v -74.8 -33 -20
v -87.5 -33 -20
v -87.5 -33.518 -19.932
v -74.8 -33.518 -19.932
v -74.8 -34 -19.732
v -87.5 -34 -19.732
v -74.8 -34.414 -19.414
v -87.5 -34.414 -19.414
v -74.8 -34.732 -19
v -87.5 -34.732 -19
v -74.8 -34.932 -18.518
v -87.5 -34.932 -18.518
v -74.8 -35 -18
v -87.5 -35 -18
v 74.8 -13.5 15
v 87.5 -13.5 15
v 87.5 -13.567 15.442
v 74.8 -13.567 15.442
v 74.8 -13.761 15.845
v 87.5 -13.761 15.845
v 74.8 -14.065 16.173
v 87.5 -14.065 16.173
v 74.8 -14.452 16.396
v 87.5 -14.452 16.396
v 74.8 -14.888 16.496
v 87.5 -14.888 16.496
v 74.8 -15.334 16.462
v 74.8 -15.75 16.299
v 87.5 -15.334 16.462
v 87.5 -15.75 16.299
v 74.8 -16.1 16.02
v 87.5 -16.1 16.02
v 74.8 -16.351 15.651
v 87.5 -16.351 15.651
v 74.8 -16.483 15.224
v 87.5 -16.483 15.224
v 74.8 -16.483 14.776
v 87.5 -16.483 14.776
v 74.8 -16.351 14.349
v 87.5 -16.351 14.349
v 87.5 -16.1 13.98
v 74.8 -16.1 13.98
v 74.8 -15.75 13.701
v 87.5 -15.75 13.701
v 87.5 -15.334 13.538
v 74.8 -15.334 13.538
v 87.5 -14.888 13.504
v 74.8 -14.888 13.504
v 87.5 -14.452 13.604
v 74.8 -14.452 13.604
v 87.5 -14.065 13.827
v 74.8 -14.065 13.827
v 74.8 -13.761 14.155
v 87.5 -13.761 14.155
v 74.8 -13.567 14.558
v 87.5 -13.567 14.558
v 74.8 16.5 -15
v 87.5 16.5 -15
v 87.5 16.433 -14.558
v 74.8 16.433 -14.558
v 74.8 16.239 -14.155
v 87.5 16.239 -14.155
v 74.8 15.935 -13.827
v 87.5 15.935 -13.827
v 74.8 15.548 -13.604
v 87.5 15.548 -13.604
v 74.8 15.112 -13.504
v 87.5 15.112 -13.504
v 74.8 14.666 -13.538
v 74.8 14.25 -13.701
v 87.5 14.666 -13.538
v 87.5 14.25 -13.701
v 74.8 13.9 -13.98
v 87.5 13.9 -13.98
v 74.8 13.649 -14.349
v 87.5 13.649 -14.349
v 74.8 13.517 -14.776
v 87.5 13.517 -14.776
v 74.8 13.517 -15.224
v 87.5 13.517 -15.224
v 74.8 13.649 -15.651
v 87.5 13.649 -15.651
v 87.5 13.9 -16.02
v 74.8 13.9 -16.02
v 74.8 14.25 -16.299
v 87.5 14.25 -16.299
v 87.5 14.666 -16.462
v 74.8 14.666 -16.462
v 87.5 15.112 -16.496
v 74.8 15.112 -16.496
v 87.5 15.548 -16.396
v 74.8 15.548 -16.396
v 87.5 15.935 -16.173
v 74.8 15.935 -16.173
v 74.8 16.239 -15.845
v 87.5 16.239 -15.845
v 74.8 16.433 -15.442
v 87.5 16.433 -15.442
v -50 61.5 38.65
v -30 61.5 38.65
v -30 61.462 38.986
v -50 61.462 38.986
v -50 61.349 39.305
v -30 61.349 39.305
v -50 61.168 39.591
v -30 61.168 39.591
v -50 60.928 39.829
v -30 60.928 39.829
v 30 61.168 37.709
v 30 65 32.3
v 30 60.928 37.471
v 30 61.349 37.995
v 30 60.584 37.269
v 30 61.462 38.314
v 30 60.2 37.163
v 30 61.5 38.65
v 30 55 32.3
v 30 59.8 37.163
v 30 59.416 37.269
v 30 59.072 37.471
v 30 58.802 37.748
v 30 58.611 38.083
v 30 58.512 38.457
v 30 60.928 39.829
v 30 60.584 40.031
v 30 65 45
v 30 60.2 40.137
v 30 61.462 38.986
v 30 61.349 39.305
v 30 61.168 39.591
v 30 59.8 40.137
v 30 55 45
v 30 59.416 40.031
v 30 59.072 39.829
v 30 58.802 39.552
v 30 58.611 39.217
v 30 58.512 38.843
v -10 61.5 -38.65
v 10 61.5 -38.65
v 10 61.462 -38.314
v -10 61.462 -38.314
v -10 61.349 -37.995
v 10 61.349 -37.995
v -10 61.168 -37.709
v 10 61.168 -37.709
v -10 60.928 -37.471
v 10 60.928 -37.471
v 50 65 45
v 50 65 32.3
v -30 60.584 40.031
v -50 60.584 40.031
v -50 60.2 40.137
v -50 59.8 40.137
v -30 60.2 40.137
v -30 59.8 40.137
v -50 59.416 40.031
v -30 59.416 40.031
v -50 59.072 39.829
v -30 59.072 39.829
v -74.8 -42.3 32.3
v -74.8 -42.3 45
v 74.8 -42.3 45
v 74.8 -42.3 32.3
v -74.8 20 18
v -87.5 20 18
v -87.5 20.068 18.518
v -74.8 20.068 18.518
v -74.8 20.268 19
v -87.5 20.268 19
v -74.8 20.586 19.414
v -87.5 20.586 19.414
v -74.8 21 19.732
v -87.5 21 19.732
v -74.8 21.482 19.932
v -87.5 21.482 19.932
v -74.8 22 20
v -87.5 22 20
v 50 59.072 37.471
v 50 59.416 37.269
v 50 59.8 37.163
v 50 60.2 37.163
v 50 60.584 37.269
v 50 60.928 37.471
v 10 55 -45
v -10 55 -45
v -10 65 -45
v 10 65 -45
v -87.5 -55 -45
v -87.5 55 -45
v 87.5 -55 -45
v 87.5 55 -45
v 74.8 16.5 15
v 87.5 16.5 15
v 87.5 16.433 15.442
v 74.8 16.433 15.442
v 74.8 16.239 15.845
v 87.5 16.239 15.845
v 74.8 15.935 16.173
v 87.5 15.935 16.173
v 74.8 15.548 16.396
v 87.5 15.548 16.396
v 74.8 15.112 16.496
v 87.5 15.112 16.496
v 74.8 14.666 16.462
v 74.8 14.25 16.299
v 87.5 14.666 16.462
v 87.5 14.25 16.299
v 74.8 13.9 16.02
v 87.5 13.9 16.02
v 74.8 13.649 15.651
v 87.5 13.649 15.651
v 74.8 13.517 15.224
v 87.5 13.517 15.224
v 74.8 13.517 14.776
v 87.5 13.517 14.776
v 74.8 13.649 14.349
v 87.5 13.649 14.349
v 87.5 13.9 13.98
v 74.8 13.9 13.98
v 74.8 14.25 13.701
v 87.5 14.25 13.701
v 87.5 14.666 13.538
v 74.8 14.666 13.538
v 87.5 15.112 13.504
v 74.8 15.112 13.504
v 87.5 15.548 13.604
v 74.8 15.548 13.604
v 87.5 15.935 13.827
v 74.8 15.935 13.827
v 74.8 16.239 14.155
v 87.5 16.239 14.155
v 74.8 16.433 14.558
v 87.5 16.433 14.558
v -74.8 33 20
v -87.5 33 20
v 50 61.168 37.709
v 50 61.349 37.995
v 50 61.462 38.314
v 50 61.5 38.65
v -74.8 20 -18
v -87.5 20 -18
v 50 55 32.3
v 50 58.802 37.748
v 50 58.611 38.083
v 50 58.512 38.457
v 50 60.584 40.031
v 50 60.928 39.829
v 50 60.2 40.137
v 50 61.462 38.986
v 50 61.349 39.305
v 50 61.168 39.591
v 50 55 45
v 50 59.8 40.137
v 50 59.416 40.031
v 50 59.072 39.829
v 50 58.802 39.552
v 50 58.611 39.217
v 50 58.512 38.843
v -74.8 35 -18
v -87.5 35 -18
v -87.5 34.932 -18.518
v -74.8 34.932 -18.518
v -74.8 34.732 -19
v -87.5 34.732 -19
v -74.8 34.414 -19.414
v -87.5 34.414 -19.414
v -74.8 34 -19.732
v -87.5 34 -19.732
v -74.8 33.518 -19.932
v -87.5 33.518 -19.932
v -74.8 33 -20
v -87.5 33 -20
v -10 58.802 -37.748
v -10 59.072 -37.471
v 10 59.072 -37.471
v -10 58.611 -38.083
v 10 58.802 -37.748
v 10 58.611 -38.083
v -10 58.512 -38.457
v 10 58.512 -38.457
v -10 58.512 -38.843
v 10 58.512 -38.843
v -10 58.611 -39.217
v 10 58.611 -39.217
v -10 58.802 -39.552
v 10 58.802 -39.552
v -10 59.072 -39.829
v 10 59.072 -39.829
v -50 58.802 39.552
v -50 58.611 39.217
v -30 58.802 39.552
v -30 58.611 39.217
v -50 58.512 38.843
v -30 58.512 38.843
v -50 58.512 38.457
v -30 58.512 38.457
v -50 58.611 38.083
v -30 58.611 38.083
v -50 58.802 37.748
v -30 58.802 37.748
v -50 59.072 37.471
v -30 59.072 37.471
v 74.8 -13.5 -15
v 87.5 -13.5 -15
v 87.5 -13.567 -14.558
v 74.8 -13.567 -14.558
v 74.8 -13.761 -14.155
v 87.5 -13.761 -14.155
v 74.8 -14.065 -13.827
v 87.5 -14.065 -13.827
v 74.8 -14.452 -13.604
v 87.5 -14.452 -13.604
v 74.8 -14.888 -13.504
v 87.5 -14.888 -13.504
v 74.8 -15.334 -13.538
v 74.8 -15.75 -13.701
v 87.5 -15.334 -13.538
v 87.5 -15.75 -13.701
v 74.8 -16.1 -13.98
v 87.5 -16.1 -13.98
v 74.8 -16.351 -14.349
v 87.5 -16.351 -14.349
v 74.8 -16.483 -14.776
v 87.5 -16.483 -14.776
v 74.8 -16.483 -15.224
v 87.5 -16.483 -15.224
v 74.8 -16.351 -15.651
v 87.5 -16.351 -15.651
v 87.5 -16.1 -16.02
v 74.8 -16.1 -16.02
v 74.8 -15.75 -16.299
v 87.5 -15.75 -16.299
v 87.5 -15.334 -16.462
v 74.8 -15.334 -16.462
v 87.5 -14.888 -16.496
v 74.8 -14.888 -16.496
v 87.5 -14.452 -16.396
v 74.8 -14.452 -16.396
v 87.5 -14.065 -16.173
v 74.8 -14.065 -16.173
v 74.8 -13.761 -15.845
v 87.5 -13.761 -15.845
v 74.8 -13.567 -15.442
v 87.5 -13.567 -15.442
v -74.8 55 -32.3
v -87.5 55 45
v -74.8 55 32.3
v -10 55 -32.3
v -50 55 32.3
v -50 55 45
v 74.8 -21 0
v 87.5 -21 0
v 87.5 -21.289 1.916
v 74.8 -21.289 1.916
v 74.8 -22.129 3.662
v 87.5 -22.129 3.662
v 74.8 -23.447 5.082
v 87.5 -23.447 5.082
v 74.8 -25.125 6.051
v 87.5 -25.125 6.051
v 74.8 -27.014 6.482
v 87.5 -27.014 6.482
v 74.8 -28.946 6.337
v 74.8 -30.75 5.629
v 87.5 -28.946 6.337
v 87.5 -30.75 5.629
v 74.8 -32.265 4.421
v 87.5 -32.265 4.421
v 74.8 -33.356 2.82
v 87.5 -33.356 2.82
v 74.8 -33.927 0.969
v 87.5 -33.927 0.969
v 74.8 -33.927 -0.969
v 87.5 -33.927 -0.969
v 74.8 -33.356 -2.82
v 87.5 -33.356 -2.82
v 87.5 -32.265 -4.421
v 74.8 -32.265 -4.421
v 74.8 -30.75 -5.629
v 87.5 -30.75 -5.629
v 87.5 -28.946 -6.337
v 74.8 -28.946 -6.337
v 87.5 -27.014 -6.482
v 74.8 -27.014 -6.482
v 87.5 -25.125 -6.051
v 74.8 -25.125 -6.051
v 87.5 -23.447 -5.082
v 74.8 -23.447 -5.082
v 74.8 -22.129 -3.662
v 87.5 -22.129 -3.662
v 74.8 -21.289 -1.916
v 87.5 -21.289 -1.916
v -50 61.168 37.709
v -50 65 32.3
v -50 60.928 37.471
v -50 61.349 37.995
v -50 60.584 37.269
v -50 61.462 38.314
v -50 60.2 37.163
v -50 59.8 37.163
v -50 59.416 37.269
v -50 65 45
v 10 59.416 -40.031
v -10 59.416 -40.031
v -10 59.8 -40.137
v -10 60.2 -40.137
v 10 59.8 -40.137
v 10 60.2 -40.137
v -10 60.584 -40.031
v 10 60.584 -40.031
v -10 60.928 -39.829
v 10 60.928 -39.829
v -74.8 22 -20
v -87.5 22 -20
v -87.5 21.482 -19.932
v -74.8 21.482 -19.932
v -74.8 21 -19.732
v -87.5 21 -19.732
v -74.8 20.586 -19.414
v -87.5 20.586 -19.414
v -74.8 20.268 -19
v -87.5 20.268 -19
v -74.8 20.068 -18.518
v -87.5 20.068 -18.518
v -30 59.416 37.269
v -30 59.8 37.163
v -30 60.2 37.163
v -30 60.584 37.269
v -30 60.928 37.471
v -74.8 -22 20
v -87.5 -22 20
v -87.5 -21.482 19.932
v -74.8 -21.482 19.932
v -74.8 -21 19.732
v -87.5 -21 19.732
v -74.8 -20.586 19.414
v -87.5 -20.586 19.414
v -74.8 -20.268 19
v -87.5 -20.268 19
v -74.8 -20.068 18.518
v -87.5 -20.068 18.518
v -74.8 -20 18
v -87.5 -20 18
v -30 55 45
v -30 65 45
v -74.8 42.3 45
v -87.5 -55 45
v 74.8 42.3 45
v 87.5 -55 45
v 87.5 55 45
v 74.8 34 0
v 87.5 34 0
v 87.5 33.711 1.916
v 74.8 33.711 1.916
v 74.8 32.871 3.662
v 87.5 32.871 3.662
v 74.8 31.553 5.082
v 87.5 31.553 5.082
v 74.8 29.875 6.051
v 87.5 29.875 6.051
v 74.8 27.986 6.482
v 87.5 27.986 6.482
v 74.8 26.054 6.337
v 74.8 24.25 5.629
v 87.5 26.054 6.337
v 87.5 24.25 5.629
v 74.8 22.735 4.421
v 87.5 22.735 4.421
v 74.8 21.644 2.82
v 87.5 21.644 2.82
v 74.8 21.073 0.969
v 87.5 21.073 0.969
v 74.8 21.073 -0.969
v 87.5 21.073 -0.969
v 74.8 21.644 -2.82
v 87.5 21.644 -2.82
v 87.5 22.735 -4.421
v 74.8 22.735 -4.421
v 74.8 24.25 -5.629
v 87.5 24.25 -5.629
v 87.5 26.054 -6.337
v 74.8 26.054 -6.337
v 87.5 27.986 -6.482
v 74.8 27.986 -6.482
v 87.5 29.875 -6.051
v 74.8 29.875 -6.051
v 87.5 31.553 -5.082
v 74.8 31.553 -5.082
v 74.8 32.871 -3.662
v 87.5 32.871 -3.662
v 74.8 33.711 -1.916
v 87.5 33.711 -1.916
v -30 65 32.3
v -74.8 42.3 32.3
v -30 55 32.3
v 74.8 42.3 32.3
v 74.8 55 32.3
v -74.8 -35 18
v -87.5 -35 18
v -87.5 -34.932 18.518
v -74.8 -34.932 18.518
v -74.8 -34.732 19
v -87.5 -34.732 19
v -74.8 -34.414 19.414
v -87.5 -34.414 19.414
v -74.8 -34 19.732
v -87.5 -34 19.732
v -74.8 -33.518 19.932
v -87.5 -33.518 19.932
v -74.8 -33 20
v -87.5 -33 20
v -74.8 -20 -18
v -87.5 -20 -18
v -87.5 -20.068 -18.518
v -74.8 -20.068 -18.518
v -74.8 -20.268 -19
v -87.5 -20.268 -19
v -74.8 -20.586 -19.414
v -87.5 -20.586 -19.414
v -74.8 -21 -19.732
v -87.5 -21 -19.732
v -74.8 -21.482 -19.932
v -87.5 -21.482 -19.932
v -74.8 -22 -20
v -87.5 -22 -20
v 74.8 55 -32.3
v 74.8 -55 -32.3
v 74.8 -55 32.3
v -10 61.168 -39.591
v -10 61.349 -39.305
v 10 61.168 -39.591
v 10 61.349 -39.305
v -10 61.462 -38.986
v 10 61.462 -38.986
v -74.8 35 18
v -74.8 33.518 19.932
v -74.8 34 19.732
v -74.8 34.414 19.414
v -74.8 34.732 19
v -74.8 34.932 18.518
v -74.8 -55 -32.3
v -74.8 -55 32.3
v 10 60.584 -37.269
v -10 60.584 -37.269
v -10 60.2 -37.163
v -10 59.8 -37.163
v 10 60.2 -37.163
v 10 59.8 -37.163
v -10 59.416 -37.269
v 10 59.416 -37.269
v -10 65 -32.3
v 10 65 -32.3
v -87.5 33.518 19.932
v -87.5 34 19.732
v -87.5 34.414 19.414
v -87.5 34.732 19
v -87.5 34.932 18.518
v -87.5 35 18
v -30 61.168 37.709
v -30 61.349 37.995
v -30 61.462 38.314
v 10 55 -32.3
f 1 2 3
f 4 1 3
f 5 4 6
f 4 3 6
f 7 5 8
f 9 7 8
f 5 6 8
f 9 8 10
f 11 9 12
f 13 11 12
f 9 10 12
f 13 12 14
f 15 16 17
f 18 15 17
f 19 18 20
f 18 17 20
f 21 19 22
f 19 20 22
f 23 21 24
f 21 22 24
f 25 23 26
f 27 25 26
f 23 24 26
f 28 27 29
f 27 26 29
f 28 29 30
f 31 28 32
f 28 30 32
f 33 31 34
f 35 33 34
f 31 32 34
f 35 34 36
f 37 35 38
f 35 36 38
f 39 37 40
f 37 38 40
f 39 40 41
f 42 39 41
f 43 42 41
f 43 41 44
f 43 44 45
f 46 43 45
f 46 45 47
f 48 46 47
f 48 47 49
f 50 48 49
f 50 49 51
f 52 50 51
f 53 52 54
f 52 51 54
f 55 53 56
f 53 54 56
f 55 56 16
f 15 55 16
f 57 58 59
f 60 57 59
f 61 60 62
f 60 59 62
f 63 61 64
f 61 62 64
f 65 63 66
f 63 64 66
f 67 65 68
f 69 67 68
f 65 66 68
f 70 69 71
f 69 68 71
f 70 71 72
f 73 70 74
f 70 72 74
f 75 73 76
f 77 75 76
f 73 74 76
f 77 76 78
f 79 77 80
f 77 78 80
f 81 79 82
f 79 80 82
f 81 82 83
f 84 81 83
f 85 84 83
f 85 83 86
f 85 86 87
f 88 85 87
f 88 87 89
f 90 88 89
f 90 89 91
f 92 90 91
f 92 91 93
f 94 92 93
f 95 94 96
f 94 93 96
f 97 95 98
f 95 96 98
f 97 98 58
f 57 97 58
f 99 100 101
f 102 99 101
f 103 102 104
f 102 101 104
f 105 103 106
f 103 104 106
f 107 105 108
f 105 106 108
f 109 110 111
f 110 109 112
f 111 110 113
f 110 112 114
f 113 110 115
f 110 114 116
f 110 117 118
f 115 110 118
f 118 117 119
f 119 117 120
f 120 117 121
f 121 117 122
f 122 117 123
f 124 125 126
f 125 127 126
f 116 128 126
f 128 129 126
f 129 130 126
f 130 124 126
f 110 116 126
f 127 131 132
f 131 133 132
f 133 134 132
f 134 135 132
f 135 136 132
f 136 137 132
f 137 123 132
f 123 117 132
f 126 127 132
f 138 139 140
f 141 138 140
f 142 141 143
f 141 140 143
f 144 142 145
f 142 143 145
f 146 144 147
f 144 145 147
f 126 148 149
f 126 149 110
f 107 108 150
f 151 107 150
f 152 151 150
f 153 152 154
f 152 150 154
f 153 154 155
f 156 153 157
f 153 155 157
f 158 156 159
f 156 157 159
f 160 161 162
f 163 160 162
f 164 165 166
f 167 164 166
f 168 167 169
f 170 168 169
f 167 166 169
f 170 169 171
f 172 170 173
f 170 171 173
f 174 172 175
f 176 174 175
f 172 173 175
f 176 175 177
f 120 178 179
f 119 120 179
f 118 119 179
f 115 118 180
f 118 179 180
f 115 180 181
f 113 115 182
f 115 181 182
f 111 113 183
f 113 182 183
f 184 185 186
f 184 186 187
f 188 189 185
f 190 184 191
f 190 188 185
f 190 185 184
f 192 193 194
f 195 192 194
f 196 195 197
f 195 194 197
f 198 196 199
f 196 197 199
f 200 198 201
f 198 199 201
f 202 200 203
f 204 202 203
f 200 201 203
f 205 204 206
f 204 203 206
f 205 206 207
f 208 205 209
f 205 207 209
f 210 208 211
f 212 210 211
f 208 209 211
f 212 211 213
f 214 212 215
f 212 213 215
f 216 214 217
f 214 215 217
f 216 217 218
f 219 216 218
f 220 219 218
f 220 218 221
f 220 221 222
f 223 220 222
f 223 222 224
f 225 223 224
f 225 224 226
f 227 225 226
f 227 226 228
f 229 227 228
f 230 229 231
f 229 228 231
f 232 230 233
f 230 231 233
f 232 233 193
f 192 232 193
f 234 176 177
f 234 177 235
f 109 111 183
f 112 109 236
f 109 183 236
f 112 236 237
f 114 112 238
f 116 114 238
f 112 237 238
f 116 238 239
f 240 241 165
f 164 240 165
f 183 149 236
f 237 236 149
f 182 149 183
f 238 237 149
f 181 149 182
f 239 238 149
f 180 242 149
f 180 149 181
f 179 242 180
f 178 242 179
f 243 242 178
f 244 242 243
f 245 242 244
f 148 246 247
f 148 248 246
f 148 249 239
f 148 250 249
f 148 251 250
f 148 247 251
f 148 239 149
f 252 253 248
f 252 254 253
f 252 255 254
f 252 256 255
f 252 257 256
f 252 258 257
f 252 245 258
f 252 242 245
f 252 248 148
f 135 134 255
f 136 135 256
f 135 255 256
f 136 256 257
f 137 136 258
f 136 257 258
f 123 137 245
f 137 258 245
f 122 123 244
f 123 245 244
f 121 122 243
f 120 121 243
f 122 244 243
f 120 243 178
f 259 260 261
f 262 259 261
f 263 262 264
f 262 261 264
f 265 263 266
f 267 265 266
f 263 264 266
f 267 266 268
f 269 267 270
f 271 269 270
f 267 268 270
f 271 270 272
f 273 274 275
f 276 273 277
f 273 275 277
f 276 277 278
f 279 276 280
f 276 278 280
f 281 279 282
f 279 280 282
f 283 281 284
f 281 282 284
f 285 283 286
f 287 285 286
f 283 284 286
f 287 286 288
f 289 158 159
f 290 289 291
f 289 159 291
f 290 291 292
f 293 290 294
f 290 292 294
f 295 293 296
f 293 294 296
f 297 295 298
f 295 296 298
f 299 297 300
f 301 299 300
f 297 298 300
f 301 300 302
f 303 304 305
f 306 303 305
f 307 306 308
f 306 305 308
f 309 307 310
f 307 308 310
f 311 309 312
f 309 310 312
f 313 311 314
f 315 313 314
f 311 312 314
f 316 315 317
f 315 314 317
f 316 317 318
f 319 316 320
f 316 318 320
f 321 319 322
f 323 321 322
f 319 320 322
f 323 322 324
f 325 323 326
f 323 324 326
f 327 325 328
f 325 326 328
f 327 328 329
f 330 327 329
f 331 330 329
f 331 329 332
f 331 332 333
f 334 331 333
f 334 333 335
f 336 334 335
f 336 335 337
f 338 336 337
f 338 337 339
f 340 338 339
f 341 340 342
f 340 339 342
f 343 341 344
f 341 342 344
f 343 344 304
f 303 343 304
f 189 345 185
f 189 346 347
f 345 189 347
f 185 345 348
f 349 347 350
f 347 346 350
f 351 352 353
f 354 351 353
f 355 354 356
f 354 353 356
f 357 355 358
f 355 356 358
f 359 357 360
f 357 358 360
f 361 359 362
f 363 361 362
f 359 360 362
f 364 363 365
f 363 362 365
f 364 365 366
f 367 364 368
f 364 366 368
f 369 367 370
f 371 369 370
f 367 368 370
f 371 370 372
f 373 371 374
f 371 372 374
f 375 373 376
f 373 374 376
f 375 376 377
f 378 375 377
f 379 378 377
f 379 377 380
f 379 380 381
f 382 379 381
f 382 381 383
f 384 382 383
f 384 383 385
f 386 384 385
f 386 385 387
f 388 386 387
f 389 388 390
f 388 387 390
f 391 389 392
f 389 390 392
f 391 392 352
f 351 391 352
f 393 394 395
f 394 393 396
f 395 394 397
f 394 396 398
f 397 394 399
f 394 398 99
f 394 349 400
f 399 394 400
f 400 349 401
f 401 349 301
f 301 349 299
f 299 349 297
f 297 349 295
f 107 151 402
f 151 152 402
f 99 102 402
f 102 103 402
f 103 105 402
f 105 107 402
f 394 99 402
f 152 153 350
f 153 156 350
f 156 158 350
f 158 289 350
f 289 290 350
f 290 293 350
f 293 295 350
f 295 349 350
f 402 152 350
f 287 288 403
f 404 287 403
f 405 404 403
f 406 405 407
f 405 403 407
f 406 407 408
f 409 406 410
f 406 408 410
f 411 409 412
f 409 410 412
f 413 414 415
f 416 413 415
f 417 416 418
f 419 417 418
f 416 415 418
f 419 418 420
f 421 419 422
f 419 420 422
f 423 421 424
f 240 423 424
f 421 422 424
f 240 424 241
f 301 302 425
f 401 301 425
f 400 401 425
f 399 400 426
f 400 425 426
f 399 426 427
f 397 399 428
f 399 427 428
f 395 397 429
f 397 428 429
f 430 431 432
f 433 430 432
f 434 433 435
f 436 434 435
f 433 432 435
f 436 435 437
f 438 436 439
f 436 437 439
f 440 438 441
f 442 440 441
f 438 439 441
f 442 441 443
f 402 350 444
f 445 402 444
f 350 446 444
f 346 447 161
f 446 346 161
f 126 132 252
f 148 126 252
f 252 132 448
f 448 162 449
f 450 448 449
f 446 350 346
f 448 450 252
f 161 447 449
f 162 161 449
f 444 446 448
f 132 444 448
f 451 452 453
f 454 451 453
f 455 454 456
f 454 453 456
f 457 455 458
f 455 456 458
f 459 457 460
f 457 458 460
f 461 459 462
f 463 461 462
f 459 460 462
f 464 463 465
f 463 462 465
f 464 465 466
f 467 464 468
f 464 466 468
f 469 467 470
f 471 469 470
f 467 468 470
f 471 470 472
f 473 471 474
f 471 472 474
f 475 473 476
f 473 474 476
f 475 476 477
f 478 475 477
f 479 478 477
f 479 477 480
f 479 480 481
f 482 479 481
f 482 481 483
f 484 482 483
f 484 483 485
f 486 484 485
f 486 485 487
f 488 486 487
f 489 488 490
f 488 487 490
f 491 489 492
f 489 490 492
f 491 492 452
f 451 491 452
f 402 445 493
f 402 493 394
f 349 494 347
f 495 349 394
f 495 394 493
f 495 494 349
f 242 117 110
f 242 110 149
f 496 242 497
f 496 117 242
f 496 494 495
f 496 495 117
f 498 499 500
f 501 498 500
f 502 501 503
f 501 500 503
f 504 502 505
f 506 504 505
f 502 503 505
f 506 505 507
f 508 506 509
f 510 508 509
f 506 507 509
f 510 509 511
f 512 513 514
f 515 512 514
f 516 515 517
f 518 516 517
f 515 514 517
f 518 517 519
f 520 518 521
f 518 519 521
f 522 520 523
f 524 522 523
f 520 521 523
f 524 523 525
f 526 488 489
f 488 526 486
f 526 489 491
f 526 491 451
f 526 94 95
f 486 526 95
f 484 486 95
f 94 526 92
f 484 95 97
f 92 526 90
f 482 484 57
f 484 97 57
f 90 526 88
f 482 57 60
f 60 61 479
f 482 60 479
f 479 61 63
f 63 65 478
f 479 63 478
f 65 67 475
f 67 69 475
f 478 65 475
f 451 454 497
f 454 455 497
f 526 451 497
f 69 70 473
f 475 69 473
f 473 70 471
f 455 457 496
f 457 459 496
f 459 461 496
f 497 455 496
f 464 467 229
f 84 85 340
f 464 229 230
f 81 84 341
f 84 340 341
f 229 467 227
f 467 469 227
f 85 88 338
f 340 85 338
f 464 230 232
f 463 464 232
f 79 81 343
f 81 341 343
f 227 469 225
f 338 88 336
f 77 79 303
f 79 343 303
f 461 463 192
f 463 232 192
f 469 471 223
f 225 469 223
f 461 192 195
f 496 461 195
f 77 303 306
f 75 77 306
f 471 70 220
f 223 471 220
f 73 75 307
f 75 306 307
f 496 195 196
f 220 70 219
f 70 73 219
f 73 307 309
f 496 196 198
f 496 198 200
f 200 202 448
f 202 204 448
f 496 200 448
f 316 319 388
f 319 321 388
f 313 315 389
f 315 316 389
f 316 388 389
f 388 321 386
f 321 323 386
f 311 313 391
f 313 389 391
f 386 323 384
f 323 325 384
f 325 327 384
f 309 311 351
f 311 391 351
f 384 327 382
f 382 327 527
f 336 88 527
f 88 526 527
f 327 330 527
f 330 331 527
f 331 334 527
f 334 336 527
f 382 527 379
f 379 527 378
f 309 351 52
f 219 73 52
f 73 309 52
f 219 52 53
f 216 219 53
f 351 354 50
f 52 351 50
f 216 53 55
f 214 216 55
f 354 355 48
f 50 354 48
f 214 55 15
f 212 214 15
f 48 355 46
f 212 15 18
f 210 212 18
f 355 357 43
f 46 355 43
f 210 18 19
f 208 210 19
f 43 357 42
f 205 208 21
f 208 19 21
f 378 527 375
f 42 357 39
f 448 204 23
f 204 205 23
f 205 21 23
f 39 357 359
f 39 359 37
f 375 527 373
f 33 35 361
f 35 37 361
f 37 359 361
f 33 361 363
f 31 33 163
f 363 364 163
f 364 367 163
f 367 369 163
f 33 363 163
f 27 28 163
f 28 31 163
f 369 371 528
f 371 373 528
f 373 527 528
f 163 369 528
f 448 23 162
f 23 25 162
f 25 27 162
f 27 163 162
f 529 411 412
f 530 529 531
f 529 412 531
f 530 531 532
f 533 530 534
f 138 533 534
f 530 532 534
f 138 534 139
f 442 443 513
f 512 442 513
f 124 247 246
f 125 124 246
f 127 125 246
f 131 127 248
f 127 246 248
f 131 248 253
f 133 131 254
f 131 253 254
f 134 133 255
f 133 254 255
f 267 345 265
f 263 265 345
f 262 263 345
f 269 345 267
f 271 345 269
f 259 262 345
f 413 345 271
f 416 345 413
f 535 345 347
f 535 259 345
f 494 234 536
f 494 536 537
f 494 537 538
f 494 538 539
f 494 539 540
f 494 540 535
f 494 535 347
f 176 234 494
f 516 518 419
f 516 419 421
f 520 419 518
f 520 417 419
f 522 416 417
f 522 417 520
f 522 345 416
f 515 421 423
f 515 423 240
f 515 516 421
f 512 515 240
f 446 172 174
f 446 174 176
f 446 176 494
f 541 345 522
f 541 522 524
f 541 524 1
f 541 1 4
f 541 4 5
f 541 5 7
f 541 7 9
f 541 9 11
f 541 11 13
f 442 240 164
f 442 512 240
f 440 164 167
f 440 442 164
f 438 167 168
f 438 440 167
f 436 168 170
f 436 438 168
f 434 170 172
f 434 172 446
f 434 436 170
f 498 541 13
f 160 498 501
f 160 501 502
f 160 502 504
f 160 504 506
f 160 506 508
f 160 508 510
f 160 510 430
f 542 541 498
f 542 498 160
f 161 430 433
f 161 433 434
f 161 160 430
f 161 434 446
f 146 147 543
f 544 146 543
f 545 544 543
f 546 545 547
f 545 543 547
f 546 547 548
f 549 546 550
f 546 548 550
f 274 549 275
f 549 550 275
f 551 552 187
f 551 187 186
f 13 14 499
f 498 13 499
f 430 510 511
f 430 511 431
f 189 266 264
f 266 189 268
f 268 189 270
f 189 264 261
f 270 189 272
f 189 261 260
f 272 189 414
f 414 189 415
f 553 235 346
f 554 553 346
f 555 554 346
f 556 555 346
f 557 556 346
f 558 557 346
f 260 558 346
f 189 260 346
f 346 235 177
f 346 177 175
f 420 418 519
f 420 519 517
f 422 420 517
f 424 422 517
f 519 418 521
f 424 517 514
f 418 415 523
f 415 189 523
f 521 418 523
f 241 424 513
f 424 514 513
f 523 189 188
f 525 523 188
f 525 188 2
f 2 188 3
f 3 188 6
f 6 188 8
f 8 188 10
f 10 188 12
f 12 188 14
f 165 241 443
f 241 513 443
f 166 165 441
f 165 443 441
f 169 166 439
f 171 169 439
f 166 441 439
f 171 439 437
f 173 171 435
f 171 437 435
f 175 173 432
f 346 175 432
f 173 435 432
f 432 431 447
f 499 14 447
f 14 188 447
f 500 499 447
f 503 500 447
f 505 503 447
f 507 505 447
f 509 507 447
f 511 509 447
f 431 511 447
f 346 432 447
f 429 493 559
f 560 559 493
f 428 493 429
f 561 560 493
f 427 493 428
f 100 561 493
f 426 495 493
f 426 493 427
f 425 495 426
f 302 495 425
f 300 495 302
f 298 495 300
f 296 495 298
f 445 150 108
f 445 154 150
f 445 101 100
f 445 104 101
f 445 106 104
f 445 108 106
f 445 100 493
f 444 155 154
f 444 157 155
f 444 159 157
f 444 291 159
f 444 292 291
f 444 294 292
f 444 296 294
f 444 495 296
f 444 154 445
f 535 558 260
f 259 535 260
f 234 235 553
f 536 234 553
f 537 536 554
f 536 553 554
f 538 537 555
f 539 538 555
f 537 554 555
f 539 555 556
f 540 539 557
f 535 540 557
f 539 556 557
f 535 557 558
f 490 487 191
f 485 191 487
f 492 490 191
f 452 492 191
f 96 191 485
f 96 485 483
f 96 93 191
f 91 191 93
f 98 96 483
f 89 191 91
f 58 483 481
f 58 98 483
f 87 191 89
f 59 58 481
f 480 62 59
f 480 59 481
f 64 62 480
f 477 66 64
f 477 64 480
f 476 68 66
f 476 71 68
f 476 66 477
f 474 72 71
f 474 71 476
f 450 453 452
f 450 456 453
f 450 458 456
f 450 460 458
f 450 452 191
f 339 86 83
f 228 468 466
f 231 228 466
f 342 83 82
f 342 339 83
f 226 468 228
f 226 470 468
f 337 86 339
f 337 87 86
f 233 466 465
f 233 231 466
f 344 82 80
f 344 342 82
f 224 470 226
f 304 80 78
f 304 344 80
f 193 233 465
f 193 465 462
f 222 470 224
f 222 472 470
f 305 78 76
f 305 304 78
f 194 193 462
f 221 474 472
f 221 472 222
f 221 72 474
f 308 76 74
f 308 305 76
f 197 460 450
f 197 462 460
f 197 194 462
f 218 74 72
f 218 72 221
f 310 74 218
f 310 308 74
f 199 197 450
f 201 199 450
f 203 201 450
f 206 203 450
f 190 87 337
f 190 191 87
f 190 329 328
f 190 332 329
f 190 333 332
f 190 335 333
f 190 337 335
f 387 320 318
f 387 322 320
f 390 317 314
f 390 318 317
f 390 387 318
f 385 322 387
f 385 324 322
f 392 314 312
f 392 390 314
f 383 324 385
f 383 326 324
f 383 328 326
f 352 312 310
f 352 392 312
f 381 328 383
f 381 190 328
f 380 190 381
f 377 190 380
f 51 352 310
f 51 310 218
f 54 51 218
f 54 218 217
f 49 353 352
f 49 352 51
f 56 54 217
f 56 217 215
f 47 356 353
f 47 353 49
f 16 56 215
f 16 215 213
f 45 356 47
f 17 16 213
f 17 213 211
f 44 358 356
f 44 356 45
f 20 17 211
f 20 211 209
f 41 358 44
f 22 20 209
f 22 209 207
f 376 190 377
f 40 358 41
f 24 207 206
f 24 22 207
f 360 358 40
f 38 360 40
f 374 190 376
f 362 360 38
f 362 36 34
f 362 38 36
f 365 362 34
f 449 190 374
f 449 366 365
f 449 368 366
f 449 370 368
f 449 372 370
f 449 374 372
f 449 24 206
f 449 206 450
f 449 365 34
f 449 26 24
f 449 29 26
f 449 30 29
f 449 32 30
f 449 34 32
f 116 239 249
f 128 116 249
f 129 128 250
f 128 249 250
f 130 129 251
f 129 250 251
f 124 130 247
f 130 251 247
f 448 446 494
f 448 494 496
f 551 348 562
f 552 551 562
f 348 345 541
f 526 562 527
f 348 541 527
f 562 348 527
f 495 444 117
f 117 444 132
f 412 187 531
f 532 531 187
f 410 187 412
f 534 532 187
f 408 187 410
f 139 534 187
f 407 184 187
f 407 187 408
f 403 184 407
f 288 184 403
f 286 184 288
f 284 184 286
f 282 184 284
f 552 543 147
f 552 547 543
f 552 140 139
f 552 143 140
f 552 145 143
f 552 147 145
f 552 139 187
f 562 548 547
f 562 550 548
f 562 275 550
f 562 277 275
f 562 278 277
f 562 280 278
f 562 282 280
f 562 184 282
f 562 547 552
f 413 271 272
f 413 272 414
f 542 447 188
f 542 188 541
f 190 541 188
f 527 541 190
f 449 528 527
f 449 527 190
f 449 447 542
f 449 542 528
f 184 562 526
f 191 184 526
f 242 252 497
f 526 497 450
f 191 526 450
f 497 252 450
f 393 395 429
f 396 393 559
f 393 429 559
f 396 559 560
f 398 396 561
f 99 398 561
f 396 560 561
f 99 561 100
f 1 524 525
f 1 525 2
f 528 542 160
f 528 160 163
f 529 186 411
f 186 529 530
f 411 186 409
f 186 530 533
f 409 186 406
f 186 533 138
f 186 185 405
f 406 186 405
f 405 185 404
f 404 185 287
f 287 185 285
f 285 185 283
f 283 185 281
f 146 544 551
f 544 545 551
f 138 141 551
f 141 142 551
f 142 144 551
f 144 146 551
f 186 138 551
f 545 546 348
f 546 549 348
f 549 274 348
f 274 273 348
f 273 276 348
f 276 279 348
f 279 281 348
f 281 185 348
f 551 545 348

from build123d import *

# Parameters (mm, degrees)
F0_W      = 175
F0_H      = 90
F1_DEPTH  = 55
F3_W      = 149.6
F3_H      = 64.6
F4_DEPTH  = 110
F5_W      = 149.6
F5_H      = 84.6
F6_DEPTH  = 12.7
F7_DEPTH  = 12.7
F8_R      = 1.5
F9_DEPTH  = 12.7
F10_W     = 10
F10_H     = 12.7
F10_W_2   = 20
F11_DEPTH = 10
F13_DEPTH = 137.501
F15_DEPTH = 97.501


with BuildPart() as f1:
    # F0 (on Front) → F1 (new body, symmetric)
    with BuildSketch(Plane.XZ):
        Rectangle(F0_W, F0_H)
    extrude(amount=F1_DEPTH, both=True)

    # F3 (on face) → F4 (cut)
    with BuildSketch(Plane.XZ.offset(55)):
        Rectangle(F3_W, F3_H)
    extrude(amount=-F4_DEPTH, mode=Mode.SUBTRACT)

    # F5 (on face) → F6 (cut)
    with BuildSketch(Plane.XY.offset(45)):
        Rectangle(F5_W, F5_H)
    extrude(amount=-F6_DEPTH, mode=Mode.SUBTRACT)

    # F2 (on face) → F7 (cut)
    with BuildSketch(Plane(origin=(-87.5, 0, 0), x_dir=(0, -1, 0), z_dir=(-1, 0, 0))):
        with BuildLine():
            Line((20, 18), (20, 0))
            Line((20, 0), (20, -18))
            ThreePointArc((20, -18), (20.585786, -19.414214), (22, -20))
            Line((22, -20), (33, -20))
            ThreePointArc((33, -20), (34.414214, -19.414214), (35, -18))
            Line((35, -18), (35, 0))
            Line((35, 0), (35, 18))
            ThreePointArc((35, 18), (34.414214, 19.414214), (33, 20))
            Line((33, 20), (22, 20))
            ThreePointArc((22, 20), (20.585786, 19.414214), (20, 18))
        make_face()
        with BuildLine():
            Line((-22, 20), (-33, 20))
            ThreePointArc((-33, 20), (-34.414214, 19.414214), (-35, 18))
            Line((-35, 18), (-35, 0))
            Line((-35, 0), (-35, -18))
            ThreePointArc((-35, -18), (-34.414214, -19.414214), (-33, -20))
            Line((-33, -20), (-22, -20))
            ThreePointArc((-22, -20), (-20.585786, -19.414214), (-20, -18))
            Line((-20, -18), (-20, 0))
            Line((-20, 0), (-20, 18))
            ThreePointArc((-20, 18), (-20.585786, 19.414214), (-22, 20))
        make_face()
    extrude(amount=-F7_DEPTH, mode=Mode.SUBTRACT)

    # F8 (on face) → F9 (cut)
    with BuildSketch(Plane.YZ.offset(87.5)):
        with BuildLine():
            ThreePointArc((-34, 0), (-27.5, -6.5), (-21, 0))
            Line((-21, 0), (-34, 0))
        make_face()
        with BuildLine():
            Line((-34, 0), (-21, 0))
            ThreePointArc((-21, 0), (-27.5, 6.5), (-34, 0))
        make_face()
        with BuildLine():
            Line((34, 0), (21, 0))
            ThreePointArc((21, 0), (27.5, -6.5), (34, 0))
        make_face()
        with BuildLine():
            ThreePointArc((34, 0), (27.5, 6.5), (21, 0))
            Line((21, 0), (34, 0))
        make_face()
        with Locations((-15, -15)):
            Circle(F8_R)
        with Locations((-15, 15)):
            Circle(F8_R)
        with Locations((15, 15)):
            Circle(F8_R)
        with Locations((15, -15)):
            Circle(F8_R)
    extrude(amount=-F9_DEPTH, mode=Mode.SUBTRACT)

    # F10 (on face) → F11 (join)
    with BuildSketch(Plane(origin=(0, 55, 0), x_dir=(-1, 0, 0), z_dir=(0, 1, 0))):
        with Locations((5, -38.65)):
            Rectangle(F10_W, F10_H)
        with Locations((-5, -38.65)):
            Rectangle(F10_W, F10_H)
        with Locations((-40, 38.65)):
            Rectangle(F10_W_2, F10_H)
        with Locations((40, 38.65)):
            Rectangle(F10_W_2, F10_H)
    extrude(amount=F11_DEPTH)

    # F12 (on face) → F13 (cut, through all)
    with BuildSketch(Plane.YZ.offset(50)):
        with BuildLine():
            ThreePointArc((60.927961, 39.828511), (60, 40.15), (59.072039, 39.828511))
            Line((59.072039, 39.828511), (60, 38.65))
            Line((60, 38.65), (60.927961, 39.828511))
        make_face()
        with BuildLine():
            Line((60, 38.65), (59.072039, 39.828511))
            ThreePointArc((59.072039, 39.828511), (58.5, 38.65), (59.072039, 37.471489))
            Line((59.072039, 37.471489), (60, 38.65))
        make_face()
        with BuildLine():
            Line((60.927961, 39.828511), (60, 38.65))
            Line((60, 38.65), (60.927961, 37.471489))
            ThreePointArc((60.927961, 37.471489), (61.349434, 37.994997), (61.5, 38.65))
            ThreePointArc((61.5, 38.65), (61.349434, 39.305003), (60.927961, 39.828511))
        make_face()
        with BuildLine():
            Line((60.927961, 37.471489), (60, 38.65))
            Line((60, 38.65), (59.072039, 37.471489))
            ThreePointArc((59.072039, 37.471489), (60, 37.15), (60.927961, 37.471489))
        make_face()
    extrude(amount=-F13_DEPTH, mode=Mode.SUBTRACT)

    # F14 (on face) → F15 (cut, through all)
    with BuildSketch(Plane.YZ.offset(10)):
        with BuildLine():
            ThreePointArc((60.927961, -37.471489), (60, -37.15), (59.072039, -37.471489))
            Line((59.072039, -37.471489), (60, -38.65))
            Line((60, -38.65), (60.927961, -37.471489))
        make_face()
        with BuildLine():
            Line((60, -38.65), (59.072039, -37.471489))
            ThreePointArc((59.072039, -37.471489), (58.5, -38.65), (59.072039, -39.828511))
            Line((59.072039, -39.828511), (60, -38.65))
        make_face()
        with BuildLine():
            Line((60.927961, -37.471489), (60, -38.65))
            Line((60, -38.65), (60.927961, -39.828511))
            ThreePointArc((60.927961, -39.828511), (61.349434, -39.305003), (61.5, -38.65))
            ThreePointArc((61.5, -38.65), (61.349434, -37.994997), (60.927961, -37.471489))
        make_face()
        with BuildLine():
            Line((60.927961, -39.828511), (60, -38.65))
            Line((60, -38.65), (59.072039, -39.828511))
            ThreePointArc((59.072039, -39.828511), (60, -40.15), (60.927961, -39.828511))
        make_face()
    extrude(amount=-F15_DEPTH, mode=Mode.SUBTRACT)


solid = f1.part
